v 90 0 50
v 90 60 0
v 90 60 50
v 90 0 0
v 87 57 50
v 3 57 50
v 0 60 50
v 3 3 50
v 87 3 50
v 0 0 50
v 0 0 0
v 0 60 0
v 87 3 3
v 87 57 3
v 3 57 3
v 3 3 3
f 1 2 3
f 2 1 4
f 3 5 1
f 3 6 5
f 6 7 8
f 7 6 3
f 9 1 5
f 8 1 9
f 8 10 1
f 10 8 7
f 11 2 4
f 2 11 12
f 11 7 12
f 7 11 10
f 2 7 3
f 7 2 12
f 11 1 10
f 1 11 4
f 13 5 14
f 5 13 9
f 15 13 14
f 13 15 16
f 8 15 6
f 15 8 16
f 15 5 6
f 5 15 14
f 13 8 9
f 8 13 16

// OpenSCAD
outer_length = 90;
outer_width = 60;
outer_height = 50;
wall_thickness = 3;
lip_height = 5;

module main() {
    difference() {
        cube([outer_length, outer_width, outer_height], center = false);
        translate([wall_thickness, wall_thickness, wall_thickness])
            cube([
                outer_length - 2 * wall_thickness,
                outer_width - 2 * wall_thickness,
                outer_height
            ], center = false);
    }
    translate([0, 0, outer_height - lip_height])
        difference() {
            cube([outer_length, outer_width, lip_height], center = false);
            translate([wall_thickness, wall_thickness, 0])
                cube([
                    outer_length - 2 * wall_thickness,
                    outer_width - 2 * wall_thickness,
                    lip_height
                ], center = false);
        }
}

main();
